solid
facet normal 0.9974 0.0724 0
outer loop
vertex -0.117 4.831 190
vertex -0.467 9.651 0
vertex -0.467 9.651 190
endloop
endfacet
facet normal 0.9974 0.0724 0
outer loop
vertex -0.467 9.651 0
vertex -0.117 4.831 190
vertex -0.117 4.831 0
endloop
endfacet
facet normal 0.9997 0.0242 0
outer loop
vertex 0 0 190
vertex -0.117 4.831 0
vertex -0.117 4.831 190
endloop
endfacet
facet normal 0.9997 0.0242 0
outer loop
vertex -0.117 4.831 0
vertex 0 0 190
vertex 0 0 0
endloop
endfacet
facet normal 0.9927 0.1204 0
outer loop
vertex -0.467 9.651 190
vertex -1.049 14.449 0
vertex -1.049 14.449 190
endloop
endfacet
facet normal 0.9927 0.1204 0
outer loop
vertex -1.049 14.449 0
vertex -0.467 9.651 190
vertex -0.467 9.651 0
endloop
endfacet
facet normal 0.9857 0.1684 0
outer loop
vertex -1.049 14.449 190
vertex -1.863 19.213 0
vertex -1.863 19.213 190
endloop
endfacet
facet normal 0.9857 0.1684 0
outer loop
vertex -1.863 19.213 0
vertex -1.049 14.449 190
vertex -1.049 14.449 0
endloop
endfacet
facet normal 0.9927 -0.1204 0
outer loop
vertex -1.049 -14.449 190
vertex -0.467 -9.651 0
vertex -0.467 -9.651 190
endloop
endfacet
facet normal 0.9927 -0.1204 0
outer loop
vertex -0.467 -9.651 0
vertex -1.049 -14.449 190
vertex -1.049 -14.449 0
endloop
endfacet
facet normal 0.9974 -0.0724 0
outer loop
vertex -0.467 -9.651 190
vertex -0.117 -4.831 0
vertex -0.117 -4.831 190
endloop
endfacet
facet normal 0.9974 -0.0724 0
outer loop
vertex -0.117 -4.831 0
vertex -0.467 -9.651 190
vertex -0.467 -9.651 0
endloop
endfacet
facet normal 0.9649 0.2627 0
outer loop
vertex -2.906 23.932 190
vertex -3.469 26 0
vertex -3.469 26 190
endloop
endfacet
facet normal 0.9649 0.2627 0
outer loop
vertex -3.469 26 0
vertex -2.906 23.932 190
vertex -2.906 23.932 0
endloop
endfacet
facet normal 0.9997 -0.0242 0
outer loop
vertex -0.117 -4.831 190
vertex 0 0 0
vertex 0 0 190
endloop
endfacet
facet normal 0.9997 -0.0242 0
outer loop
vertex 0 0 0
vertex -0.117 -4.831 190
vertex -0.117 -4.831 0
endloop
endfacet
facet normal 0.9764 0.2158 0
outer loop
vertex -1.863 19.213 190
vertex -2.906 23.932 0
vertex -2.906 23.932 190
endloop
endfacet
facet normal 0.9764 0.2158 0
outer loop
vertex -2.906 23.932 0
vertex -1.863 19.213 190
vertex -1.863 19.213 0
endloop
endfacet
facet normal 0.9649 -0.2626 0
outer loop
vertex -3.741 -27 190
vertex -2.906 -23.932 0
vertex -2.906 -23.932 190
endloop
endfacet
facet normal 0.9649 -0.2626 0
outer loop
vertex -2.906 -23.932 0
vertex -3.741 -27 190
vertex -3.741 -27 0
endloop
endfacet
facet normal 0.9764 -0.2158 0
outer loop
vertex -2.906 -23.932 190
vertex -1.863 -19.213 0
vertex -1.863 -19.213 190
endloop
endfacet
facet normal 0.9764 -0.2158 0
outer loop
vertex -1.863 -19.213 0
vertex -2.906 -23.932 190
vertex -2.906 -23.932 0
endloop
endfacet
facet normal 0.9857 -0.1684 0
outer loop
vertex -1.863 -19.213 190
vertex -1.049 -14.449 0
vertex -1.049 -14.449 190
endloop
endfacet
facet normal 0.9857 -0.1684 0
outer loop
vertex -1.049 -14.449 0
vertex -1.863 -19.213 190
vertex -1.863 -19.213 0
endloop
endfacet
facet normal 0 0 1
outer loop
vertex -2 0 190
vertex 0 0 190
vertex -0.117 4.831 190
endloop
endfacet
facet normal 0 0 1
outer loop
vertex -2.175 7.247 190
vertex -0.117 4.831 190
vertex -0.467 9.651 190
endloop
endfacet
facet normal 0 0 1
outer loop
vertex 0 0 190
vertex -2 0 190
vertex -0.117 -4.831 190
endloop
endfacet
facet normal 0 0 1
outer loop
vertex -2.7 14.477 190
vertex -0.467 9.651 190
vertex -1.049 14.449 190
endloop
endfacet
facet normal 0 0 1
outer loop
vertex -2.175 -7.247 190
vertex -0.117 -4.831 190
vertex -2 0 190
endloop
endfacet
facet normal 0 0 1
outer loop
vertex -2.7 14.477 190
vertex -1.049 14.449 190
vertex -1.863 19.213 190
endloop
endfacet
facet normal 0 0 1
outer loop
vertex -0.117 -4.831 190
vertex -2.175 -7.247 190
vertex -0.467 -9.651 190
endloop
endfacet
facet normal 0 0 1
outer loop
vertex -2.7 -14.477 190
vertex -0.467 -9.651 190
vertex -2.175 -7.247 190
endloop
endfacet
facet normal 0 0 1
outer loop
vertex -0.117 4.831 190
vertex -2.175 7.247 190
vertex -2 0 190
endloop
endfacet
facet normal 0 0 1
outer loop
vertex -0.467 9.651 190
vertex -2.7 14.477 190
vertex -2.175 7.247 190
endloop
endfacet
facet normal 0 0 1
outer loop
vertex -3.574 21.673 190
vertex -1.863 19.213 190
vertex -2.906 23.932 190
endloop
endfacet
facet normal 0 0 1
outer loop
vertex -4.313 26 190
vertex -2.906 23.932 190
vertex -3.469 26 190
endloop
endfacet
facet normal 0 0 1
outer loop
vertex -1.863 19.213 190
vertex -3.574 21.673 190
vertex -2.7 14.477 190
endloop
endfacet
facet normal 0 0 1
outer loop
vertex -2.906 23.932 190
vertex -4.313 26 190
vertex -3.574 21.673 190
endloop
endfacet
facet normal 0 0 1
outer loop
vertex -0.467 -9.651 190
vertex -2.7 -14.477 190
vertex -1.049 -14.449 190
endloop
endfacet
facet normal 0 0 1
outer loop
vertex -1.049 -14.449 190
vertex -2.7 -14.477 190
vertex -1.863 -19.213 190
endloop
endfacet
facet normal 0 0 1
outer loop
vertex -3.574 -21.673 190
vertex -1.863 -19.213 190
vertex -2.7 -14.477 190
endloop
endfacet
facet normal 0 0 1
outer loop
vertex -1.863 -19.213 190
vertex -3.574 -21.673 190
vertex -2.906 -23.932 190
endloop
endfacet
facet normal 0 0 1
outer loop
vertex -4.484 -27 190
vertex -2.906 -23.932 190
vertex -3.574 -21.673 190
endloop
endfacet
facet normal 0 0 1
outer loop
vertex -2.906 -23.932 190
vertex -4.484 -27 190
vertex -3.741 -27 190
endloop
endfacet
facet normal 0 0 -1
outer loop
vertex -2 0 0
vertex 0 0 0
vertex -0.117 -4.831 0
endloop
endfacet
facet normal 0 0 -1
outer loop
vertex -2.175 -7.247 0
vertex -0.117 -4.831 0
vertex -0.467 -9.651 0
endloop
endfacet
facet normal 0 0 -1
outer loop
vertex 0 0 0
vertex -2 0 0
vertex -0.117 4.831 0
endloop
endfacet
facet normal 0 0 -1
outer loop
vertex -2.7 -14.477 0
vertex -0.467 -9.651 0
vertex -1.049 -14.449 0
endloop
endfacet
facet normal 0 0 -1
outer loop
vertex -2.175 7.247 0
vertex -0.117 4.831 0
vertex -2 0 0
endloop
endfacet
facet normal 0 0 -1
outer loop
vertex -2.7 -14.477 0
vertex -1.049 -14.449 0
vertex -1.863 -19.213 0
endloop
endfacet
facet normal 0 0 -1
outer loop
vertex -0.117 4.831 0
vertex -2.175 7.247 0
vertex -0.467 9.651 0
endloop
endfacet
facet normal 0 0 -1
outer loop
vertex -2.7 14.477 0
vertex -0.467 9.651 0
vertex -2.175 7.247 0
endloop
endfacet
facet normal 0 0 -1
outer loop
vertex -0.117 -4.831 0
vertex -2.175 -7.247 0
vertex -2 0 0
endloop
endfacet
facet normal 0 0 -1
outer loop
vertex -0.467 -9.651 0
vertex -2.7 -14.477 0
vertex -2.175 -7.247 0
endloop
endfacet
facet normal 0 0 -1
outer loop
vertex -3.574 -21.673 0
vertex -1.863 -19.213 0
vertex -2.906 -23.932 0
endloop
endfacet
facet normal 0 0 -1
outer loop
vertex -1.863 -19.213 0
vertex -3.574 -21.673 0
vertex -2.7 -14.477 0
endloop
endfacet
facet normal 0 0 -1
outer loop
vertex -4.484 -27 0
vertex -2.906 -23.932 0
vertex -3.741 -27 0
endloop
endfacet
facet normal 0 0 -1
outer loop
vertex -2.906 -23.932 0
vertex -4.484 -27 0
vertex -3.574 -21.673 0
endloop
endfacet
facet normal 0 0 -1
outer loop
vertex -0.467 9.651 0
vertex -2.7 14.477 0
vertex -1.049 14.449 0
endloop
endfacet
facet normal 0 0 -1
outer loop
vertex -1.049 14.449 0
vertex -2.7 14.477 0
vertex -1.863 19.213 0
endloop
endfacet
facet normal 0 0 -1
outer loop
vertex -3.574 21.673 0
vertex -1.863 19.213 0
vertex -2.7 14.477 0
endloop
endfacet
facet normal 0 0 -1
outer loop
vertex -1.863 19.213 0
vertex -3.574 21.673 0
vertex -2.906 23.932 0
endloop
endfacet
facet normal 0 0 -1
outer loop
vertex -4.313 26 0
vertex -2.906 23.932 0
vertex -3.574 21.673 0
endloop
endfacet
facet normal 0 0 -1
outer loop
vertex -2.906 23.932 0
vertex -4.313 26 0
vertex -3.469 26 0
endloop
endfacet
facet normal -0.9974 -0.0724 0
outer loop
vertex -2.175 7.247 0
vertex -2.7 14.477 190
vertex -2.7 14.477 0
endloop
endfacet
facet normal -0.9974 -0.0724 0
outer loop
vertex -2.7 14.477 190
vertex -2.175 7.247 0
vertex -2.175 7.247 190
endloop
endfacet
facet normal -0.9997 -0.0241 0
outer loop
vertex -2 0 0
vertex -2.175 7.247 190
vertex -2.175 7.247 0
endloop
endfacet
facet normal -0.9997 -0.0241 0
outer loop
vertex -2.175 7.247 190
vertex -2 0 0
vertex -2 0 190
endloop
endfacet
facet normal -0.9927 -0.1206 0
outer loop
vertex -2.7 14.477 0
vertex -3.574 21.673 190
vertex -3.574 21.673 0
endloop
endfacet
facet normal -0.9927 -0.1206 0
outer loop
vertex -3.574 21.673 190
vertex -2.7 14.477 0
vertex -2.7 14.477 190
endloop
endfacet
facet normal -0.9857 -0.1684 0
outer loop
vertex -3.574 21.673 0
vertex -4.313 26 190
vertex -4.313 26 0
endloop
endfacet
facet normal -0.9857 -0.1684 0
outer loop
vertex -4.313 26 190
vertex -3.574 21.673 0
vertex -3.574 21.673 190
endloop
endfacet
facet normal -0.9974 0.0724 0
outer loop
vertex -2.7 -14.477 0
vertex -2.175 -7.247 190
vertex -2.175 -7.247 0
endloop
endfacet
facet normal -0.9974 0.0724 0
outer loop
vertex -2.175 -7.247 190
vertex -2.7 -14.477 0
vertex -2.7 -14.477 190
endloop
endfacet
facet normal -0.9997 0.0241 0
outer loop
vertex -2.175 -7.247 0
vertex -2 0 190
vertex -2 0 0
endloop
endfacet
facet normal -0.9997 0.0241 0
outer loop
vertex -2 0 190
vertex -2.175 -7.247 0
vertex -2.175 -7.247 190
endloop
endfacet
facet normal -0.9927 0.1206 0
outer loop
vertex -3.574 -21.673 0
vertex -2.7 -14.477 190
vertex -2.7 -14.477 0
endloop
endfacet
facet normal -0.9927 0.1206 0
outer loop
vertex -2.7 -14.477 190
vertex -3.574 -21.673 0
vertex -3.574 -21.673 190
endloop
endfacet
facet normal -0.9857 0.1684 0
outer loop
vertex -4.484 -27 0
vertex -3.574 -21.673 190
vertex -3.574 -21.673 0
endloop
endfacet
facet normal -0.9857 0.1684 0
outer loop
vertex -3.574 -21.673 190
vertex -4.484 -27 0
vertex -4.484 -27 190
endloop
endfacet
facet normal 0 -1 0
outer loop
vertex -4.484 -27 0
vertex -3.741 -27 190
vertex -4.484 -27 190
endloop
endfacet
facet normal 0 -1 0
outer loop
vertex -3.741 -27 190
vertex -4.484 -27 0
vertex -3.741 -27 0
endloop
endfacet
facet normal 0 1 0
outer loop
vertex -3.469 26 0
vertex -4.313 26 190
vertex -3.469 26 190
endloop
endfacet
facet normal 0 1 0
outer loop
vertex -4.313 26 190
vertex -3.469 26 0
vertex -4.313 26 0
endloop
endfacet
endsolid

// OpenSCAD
$fn = $preview ? 180 : 130; 

width = 190;


translate([-100, 0, 0]) difference() {
    cylinder(h = width, d = 200);
    translate([-52, 0, -2]) cylinder(h = width + 10, d = 300);
    translate([88, -37, -2]) #cube([10, 10, width + 10]);
    translate([88, 26, -2]) #cube([10, 10, width + 10]);
    
}
